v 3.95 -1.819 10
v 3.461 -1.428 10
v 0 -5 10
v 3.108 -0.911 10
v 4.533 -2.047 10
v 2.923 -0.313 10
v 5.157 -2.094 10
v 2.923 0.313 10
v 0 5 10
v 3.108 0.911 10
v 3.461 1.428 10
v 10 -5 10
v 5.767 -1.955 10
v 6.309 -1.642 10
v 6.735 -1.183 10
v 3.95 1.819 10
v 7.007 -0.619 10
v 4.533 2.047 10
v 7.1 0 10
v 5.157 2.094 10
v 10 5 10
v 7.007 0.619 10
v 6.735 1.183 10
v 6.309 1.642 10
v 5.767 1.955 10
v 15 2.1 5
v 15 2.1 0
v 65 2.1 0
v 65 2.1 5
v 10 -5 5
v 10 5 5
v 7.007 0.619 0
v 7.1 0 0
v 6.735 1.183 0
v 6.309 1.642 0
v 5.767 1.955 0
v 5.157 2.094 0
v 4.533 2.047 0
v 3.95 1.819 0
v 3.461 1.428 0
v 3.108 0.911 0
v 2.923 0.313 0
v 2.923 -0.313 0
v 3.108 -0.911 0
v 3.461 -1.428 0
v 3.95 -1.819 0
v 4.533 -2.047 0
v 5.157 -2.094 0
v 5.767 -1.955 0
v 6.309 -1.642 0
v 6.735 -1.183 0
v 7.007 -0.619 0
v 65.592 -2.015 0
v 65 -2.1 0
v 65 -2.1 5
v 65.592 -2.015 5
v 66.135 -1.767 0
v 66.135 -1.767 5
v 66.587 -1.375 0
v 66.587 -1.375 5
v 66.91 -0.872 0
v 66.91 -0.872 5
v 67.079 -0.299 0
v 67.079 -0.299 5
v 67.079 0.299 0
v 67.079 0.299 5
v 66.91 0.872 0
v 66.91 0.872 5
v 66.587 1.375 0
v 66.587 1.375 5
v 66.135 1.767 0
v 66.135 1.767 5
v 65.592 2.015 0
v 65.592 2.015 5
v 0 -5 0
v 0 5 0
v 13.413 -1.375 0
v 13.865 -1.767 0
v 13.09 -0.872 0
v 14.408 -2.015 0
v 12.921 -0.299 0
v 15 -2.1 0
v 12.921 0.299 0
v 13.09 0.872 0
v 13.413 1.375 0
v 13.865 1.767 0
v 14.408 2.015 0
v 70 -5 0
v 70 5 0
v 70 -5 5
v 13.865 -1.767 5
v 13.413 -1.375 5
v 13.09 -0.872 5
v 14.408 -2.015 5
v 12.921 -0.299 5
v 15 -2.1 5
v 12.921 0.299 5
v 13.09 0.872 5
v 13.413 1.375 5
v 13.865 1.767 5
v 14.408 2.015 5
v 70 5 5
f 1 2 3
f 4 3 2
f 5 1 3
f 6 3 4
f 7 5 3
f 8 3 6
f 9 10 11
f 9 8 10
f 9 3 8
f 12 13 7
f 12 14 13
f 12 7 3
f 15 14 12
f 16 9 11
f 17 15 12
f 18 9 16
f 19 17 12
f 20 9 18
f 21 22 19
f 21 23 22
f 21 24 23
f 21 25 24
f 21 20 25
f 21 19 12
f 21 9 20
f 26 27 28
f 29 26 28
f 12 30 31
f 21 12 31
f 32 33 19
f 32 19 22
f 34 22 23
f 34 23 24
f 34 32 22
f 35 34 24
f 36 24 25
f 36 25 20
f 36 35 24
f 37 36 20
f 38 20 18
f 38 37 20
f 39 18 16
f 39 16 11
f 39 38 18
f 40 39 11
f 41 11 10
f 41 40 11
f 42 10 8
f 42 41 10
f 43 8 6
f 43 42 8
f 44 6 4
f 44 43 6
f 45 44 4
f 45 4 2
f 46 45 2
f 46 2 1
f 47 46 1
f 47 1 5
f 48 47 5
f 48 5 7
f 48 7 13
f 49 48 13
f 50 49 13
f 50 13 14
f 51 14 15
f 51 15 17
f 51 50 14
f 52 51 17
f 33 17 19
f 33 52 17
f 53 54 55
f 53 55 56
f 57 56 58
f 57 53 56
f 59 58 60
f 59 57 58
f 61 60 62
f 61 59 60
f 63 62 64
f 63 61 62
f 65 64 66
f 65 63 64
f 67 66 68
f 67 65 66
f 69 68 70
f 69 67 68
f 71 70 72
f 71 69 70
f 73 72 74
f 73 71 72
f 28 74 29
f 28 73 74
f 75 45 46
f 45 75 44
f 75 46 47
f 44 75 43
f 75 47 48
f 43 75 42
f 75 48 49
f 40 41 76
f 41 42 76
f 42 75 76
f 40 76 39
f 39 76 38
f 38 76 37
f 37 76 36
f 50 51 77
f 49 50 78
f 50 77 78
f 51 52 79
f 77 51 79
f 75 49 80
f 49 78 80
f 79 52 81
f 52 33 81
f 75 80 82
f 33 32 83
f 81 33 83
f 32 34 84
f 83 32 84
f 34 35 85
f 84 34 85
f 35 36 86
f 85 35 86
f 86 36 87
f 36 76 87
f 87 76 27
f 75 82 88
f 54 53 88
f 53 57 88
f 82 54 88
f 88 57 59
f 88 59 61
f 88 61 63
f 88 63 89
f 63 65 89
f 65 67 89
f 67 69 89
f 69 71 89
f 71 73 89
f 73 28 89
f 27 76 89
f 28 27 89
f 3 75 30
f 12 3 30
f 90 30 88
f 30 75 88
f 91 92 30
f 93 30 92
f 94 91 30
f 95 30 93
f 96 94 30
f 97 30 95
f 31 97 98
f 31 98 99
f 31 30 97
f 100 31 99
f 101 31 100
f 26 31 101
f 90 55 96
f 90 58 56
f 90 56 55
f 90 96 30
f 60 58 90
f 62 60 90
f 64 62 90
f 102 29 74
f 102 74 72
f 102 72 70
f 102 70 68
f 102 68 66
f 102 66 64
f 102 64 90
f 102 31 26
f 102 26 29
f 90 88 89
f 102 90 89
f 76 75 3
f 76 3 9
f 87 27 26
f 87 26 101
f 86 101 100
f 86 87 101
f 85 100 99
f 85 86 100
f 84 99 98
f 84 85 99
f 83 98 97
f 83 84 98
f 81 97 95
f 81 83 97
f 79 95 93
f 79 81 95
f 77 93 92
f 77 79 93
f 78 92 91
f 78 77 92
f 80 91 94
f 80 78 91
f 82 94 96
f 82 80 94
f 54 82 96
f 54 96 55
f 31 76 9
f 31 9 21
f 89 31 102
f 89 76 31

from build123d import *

# Parameters (mm, degrees)
SKETCH001_W      = 70
SKETCH001_H      = 10
EXTRUDE001_DEPTH = 5
SKETCH_W         = 70
SKETCH_H         = 10
SKETCH_R         = 2.1
EXTRUDE_DEPTH    = 10


with BuildPart() as extrude001:
    # Sketch001 → Extrude001 (new body)
    with BuildSketch(Plane.XY):
        with Locations((45, 0)):
            Rectangle(SKETCH001_W, SKETCH001_H)
    extrude(amount=EXTRUDE001_DEPTH)


with BuildPart() as extrude001_1:
    # Extrude001 placement: moved
    add(extrude001.part.moved(Location((0, 0, 5))))


with BuildPart() as cut:
    # Sketch → Extrude (new body)
    with BuildSketch(Plane.XY):
        with Locations((35, 0)):
            Rectangle(SKETCH_W, SKETCH_H)
        with Locations((5, 0)):
            Circle(SKETCH_R, mode=Mode.SUBTRACT)
        with BuildLine():
            ThreePointArc((15, 2.1), (12.9, 0), (15, -2.1))
            Line((15, -2.1), (65, -2.1))
            ThreePointArc((65, -2.1), (67.1, 0), (65, 2.1))
            Line((15, 2.1), (65, 2.1))
        make_face(mode=Mode.SUBTRACT)
    extrude(amount=EXTRUDE_DEPTH)

    # Cut: cut Extrude001
    add(extrude001_1.part, mode=Mode.SUBTRACT)


solid = cut.part
